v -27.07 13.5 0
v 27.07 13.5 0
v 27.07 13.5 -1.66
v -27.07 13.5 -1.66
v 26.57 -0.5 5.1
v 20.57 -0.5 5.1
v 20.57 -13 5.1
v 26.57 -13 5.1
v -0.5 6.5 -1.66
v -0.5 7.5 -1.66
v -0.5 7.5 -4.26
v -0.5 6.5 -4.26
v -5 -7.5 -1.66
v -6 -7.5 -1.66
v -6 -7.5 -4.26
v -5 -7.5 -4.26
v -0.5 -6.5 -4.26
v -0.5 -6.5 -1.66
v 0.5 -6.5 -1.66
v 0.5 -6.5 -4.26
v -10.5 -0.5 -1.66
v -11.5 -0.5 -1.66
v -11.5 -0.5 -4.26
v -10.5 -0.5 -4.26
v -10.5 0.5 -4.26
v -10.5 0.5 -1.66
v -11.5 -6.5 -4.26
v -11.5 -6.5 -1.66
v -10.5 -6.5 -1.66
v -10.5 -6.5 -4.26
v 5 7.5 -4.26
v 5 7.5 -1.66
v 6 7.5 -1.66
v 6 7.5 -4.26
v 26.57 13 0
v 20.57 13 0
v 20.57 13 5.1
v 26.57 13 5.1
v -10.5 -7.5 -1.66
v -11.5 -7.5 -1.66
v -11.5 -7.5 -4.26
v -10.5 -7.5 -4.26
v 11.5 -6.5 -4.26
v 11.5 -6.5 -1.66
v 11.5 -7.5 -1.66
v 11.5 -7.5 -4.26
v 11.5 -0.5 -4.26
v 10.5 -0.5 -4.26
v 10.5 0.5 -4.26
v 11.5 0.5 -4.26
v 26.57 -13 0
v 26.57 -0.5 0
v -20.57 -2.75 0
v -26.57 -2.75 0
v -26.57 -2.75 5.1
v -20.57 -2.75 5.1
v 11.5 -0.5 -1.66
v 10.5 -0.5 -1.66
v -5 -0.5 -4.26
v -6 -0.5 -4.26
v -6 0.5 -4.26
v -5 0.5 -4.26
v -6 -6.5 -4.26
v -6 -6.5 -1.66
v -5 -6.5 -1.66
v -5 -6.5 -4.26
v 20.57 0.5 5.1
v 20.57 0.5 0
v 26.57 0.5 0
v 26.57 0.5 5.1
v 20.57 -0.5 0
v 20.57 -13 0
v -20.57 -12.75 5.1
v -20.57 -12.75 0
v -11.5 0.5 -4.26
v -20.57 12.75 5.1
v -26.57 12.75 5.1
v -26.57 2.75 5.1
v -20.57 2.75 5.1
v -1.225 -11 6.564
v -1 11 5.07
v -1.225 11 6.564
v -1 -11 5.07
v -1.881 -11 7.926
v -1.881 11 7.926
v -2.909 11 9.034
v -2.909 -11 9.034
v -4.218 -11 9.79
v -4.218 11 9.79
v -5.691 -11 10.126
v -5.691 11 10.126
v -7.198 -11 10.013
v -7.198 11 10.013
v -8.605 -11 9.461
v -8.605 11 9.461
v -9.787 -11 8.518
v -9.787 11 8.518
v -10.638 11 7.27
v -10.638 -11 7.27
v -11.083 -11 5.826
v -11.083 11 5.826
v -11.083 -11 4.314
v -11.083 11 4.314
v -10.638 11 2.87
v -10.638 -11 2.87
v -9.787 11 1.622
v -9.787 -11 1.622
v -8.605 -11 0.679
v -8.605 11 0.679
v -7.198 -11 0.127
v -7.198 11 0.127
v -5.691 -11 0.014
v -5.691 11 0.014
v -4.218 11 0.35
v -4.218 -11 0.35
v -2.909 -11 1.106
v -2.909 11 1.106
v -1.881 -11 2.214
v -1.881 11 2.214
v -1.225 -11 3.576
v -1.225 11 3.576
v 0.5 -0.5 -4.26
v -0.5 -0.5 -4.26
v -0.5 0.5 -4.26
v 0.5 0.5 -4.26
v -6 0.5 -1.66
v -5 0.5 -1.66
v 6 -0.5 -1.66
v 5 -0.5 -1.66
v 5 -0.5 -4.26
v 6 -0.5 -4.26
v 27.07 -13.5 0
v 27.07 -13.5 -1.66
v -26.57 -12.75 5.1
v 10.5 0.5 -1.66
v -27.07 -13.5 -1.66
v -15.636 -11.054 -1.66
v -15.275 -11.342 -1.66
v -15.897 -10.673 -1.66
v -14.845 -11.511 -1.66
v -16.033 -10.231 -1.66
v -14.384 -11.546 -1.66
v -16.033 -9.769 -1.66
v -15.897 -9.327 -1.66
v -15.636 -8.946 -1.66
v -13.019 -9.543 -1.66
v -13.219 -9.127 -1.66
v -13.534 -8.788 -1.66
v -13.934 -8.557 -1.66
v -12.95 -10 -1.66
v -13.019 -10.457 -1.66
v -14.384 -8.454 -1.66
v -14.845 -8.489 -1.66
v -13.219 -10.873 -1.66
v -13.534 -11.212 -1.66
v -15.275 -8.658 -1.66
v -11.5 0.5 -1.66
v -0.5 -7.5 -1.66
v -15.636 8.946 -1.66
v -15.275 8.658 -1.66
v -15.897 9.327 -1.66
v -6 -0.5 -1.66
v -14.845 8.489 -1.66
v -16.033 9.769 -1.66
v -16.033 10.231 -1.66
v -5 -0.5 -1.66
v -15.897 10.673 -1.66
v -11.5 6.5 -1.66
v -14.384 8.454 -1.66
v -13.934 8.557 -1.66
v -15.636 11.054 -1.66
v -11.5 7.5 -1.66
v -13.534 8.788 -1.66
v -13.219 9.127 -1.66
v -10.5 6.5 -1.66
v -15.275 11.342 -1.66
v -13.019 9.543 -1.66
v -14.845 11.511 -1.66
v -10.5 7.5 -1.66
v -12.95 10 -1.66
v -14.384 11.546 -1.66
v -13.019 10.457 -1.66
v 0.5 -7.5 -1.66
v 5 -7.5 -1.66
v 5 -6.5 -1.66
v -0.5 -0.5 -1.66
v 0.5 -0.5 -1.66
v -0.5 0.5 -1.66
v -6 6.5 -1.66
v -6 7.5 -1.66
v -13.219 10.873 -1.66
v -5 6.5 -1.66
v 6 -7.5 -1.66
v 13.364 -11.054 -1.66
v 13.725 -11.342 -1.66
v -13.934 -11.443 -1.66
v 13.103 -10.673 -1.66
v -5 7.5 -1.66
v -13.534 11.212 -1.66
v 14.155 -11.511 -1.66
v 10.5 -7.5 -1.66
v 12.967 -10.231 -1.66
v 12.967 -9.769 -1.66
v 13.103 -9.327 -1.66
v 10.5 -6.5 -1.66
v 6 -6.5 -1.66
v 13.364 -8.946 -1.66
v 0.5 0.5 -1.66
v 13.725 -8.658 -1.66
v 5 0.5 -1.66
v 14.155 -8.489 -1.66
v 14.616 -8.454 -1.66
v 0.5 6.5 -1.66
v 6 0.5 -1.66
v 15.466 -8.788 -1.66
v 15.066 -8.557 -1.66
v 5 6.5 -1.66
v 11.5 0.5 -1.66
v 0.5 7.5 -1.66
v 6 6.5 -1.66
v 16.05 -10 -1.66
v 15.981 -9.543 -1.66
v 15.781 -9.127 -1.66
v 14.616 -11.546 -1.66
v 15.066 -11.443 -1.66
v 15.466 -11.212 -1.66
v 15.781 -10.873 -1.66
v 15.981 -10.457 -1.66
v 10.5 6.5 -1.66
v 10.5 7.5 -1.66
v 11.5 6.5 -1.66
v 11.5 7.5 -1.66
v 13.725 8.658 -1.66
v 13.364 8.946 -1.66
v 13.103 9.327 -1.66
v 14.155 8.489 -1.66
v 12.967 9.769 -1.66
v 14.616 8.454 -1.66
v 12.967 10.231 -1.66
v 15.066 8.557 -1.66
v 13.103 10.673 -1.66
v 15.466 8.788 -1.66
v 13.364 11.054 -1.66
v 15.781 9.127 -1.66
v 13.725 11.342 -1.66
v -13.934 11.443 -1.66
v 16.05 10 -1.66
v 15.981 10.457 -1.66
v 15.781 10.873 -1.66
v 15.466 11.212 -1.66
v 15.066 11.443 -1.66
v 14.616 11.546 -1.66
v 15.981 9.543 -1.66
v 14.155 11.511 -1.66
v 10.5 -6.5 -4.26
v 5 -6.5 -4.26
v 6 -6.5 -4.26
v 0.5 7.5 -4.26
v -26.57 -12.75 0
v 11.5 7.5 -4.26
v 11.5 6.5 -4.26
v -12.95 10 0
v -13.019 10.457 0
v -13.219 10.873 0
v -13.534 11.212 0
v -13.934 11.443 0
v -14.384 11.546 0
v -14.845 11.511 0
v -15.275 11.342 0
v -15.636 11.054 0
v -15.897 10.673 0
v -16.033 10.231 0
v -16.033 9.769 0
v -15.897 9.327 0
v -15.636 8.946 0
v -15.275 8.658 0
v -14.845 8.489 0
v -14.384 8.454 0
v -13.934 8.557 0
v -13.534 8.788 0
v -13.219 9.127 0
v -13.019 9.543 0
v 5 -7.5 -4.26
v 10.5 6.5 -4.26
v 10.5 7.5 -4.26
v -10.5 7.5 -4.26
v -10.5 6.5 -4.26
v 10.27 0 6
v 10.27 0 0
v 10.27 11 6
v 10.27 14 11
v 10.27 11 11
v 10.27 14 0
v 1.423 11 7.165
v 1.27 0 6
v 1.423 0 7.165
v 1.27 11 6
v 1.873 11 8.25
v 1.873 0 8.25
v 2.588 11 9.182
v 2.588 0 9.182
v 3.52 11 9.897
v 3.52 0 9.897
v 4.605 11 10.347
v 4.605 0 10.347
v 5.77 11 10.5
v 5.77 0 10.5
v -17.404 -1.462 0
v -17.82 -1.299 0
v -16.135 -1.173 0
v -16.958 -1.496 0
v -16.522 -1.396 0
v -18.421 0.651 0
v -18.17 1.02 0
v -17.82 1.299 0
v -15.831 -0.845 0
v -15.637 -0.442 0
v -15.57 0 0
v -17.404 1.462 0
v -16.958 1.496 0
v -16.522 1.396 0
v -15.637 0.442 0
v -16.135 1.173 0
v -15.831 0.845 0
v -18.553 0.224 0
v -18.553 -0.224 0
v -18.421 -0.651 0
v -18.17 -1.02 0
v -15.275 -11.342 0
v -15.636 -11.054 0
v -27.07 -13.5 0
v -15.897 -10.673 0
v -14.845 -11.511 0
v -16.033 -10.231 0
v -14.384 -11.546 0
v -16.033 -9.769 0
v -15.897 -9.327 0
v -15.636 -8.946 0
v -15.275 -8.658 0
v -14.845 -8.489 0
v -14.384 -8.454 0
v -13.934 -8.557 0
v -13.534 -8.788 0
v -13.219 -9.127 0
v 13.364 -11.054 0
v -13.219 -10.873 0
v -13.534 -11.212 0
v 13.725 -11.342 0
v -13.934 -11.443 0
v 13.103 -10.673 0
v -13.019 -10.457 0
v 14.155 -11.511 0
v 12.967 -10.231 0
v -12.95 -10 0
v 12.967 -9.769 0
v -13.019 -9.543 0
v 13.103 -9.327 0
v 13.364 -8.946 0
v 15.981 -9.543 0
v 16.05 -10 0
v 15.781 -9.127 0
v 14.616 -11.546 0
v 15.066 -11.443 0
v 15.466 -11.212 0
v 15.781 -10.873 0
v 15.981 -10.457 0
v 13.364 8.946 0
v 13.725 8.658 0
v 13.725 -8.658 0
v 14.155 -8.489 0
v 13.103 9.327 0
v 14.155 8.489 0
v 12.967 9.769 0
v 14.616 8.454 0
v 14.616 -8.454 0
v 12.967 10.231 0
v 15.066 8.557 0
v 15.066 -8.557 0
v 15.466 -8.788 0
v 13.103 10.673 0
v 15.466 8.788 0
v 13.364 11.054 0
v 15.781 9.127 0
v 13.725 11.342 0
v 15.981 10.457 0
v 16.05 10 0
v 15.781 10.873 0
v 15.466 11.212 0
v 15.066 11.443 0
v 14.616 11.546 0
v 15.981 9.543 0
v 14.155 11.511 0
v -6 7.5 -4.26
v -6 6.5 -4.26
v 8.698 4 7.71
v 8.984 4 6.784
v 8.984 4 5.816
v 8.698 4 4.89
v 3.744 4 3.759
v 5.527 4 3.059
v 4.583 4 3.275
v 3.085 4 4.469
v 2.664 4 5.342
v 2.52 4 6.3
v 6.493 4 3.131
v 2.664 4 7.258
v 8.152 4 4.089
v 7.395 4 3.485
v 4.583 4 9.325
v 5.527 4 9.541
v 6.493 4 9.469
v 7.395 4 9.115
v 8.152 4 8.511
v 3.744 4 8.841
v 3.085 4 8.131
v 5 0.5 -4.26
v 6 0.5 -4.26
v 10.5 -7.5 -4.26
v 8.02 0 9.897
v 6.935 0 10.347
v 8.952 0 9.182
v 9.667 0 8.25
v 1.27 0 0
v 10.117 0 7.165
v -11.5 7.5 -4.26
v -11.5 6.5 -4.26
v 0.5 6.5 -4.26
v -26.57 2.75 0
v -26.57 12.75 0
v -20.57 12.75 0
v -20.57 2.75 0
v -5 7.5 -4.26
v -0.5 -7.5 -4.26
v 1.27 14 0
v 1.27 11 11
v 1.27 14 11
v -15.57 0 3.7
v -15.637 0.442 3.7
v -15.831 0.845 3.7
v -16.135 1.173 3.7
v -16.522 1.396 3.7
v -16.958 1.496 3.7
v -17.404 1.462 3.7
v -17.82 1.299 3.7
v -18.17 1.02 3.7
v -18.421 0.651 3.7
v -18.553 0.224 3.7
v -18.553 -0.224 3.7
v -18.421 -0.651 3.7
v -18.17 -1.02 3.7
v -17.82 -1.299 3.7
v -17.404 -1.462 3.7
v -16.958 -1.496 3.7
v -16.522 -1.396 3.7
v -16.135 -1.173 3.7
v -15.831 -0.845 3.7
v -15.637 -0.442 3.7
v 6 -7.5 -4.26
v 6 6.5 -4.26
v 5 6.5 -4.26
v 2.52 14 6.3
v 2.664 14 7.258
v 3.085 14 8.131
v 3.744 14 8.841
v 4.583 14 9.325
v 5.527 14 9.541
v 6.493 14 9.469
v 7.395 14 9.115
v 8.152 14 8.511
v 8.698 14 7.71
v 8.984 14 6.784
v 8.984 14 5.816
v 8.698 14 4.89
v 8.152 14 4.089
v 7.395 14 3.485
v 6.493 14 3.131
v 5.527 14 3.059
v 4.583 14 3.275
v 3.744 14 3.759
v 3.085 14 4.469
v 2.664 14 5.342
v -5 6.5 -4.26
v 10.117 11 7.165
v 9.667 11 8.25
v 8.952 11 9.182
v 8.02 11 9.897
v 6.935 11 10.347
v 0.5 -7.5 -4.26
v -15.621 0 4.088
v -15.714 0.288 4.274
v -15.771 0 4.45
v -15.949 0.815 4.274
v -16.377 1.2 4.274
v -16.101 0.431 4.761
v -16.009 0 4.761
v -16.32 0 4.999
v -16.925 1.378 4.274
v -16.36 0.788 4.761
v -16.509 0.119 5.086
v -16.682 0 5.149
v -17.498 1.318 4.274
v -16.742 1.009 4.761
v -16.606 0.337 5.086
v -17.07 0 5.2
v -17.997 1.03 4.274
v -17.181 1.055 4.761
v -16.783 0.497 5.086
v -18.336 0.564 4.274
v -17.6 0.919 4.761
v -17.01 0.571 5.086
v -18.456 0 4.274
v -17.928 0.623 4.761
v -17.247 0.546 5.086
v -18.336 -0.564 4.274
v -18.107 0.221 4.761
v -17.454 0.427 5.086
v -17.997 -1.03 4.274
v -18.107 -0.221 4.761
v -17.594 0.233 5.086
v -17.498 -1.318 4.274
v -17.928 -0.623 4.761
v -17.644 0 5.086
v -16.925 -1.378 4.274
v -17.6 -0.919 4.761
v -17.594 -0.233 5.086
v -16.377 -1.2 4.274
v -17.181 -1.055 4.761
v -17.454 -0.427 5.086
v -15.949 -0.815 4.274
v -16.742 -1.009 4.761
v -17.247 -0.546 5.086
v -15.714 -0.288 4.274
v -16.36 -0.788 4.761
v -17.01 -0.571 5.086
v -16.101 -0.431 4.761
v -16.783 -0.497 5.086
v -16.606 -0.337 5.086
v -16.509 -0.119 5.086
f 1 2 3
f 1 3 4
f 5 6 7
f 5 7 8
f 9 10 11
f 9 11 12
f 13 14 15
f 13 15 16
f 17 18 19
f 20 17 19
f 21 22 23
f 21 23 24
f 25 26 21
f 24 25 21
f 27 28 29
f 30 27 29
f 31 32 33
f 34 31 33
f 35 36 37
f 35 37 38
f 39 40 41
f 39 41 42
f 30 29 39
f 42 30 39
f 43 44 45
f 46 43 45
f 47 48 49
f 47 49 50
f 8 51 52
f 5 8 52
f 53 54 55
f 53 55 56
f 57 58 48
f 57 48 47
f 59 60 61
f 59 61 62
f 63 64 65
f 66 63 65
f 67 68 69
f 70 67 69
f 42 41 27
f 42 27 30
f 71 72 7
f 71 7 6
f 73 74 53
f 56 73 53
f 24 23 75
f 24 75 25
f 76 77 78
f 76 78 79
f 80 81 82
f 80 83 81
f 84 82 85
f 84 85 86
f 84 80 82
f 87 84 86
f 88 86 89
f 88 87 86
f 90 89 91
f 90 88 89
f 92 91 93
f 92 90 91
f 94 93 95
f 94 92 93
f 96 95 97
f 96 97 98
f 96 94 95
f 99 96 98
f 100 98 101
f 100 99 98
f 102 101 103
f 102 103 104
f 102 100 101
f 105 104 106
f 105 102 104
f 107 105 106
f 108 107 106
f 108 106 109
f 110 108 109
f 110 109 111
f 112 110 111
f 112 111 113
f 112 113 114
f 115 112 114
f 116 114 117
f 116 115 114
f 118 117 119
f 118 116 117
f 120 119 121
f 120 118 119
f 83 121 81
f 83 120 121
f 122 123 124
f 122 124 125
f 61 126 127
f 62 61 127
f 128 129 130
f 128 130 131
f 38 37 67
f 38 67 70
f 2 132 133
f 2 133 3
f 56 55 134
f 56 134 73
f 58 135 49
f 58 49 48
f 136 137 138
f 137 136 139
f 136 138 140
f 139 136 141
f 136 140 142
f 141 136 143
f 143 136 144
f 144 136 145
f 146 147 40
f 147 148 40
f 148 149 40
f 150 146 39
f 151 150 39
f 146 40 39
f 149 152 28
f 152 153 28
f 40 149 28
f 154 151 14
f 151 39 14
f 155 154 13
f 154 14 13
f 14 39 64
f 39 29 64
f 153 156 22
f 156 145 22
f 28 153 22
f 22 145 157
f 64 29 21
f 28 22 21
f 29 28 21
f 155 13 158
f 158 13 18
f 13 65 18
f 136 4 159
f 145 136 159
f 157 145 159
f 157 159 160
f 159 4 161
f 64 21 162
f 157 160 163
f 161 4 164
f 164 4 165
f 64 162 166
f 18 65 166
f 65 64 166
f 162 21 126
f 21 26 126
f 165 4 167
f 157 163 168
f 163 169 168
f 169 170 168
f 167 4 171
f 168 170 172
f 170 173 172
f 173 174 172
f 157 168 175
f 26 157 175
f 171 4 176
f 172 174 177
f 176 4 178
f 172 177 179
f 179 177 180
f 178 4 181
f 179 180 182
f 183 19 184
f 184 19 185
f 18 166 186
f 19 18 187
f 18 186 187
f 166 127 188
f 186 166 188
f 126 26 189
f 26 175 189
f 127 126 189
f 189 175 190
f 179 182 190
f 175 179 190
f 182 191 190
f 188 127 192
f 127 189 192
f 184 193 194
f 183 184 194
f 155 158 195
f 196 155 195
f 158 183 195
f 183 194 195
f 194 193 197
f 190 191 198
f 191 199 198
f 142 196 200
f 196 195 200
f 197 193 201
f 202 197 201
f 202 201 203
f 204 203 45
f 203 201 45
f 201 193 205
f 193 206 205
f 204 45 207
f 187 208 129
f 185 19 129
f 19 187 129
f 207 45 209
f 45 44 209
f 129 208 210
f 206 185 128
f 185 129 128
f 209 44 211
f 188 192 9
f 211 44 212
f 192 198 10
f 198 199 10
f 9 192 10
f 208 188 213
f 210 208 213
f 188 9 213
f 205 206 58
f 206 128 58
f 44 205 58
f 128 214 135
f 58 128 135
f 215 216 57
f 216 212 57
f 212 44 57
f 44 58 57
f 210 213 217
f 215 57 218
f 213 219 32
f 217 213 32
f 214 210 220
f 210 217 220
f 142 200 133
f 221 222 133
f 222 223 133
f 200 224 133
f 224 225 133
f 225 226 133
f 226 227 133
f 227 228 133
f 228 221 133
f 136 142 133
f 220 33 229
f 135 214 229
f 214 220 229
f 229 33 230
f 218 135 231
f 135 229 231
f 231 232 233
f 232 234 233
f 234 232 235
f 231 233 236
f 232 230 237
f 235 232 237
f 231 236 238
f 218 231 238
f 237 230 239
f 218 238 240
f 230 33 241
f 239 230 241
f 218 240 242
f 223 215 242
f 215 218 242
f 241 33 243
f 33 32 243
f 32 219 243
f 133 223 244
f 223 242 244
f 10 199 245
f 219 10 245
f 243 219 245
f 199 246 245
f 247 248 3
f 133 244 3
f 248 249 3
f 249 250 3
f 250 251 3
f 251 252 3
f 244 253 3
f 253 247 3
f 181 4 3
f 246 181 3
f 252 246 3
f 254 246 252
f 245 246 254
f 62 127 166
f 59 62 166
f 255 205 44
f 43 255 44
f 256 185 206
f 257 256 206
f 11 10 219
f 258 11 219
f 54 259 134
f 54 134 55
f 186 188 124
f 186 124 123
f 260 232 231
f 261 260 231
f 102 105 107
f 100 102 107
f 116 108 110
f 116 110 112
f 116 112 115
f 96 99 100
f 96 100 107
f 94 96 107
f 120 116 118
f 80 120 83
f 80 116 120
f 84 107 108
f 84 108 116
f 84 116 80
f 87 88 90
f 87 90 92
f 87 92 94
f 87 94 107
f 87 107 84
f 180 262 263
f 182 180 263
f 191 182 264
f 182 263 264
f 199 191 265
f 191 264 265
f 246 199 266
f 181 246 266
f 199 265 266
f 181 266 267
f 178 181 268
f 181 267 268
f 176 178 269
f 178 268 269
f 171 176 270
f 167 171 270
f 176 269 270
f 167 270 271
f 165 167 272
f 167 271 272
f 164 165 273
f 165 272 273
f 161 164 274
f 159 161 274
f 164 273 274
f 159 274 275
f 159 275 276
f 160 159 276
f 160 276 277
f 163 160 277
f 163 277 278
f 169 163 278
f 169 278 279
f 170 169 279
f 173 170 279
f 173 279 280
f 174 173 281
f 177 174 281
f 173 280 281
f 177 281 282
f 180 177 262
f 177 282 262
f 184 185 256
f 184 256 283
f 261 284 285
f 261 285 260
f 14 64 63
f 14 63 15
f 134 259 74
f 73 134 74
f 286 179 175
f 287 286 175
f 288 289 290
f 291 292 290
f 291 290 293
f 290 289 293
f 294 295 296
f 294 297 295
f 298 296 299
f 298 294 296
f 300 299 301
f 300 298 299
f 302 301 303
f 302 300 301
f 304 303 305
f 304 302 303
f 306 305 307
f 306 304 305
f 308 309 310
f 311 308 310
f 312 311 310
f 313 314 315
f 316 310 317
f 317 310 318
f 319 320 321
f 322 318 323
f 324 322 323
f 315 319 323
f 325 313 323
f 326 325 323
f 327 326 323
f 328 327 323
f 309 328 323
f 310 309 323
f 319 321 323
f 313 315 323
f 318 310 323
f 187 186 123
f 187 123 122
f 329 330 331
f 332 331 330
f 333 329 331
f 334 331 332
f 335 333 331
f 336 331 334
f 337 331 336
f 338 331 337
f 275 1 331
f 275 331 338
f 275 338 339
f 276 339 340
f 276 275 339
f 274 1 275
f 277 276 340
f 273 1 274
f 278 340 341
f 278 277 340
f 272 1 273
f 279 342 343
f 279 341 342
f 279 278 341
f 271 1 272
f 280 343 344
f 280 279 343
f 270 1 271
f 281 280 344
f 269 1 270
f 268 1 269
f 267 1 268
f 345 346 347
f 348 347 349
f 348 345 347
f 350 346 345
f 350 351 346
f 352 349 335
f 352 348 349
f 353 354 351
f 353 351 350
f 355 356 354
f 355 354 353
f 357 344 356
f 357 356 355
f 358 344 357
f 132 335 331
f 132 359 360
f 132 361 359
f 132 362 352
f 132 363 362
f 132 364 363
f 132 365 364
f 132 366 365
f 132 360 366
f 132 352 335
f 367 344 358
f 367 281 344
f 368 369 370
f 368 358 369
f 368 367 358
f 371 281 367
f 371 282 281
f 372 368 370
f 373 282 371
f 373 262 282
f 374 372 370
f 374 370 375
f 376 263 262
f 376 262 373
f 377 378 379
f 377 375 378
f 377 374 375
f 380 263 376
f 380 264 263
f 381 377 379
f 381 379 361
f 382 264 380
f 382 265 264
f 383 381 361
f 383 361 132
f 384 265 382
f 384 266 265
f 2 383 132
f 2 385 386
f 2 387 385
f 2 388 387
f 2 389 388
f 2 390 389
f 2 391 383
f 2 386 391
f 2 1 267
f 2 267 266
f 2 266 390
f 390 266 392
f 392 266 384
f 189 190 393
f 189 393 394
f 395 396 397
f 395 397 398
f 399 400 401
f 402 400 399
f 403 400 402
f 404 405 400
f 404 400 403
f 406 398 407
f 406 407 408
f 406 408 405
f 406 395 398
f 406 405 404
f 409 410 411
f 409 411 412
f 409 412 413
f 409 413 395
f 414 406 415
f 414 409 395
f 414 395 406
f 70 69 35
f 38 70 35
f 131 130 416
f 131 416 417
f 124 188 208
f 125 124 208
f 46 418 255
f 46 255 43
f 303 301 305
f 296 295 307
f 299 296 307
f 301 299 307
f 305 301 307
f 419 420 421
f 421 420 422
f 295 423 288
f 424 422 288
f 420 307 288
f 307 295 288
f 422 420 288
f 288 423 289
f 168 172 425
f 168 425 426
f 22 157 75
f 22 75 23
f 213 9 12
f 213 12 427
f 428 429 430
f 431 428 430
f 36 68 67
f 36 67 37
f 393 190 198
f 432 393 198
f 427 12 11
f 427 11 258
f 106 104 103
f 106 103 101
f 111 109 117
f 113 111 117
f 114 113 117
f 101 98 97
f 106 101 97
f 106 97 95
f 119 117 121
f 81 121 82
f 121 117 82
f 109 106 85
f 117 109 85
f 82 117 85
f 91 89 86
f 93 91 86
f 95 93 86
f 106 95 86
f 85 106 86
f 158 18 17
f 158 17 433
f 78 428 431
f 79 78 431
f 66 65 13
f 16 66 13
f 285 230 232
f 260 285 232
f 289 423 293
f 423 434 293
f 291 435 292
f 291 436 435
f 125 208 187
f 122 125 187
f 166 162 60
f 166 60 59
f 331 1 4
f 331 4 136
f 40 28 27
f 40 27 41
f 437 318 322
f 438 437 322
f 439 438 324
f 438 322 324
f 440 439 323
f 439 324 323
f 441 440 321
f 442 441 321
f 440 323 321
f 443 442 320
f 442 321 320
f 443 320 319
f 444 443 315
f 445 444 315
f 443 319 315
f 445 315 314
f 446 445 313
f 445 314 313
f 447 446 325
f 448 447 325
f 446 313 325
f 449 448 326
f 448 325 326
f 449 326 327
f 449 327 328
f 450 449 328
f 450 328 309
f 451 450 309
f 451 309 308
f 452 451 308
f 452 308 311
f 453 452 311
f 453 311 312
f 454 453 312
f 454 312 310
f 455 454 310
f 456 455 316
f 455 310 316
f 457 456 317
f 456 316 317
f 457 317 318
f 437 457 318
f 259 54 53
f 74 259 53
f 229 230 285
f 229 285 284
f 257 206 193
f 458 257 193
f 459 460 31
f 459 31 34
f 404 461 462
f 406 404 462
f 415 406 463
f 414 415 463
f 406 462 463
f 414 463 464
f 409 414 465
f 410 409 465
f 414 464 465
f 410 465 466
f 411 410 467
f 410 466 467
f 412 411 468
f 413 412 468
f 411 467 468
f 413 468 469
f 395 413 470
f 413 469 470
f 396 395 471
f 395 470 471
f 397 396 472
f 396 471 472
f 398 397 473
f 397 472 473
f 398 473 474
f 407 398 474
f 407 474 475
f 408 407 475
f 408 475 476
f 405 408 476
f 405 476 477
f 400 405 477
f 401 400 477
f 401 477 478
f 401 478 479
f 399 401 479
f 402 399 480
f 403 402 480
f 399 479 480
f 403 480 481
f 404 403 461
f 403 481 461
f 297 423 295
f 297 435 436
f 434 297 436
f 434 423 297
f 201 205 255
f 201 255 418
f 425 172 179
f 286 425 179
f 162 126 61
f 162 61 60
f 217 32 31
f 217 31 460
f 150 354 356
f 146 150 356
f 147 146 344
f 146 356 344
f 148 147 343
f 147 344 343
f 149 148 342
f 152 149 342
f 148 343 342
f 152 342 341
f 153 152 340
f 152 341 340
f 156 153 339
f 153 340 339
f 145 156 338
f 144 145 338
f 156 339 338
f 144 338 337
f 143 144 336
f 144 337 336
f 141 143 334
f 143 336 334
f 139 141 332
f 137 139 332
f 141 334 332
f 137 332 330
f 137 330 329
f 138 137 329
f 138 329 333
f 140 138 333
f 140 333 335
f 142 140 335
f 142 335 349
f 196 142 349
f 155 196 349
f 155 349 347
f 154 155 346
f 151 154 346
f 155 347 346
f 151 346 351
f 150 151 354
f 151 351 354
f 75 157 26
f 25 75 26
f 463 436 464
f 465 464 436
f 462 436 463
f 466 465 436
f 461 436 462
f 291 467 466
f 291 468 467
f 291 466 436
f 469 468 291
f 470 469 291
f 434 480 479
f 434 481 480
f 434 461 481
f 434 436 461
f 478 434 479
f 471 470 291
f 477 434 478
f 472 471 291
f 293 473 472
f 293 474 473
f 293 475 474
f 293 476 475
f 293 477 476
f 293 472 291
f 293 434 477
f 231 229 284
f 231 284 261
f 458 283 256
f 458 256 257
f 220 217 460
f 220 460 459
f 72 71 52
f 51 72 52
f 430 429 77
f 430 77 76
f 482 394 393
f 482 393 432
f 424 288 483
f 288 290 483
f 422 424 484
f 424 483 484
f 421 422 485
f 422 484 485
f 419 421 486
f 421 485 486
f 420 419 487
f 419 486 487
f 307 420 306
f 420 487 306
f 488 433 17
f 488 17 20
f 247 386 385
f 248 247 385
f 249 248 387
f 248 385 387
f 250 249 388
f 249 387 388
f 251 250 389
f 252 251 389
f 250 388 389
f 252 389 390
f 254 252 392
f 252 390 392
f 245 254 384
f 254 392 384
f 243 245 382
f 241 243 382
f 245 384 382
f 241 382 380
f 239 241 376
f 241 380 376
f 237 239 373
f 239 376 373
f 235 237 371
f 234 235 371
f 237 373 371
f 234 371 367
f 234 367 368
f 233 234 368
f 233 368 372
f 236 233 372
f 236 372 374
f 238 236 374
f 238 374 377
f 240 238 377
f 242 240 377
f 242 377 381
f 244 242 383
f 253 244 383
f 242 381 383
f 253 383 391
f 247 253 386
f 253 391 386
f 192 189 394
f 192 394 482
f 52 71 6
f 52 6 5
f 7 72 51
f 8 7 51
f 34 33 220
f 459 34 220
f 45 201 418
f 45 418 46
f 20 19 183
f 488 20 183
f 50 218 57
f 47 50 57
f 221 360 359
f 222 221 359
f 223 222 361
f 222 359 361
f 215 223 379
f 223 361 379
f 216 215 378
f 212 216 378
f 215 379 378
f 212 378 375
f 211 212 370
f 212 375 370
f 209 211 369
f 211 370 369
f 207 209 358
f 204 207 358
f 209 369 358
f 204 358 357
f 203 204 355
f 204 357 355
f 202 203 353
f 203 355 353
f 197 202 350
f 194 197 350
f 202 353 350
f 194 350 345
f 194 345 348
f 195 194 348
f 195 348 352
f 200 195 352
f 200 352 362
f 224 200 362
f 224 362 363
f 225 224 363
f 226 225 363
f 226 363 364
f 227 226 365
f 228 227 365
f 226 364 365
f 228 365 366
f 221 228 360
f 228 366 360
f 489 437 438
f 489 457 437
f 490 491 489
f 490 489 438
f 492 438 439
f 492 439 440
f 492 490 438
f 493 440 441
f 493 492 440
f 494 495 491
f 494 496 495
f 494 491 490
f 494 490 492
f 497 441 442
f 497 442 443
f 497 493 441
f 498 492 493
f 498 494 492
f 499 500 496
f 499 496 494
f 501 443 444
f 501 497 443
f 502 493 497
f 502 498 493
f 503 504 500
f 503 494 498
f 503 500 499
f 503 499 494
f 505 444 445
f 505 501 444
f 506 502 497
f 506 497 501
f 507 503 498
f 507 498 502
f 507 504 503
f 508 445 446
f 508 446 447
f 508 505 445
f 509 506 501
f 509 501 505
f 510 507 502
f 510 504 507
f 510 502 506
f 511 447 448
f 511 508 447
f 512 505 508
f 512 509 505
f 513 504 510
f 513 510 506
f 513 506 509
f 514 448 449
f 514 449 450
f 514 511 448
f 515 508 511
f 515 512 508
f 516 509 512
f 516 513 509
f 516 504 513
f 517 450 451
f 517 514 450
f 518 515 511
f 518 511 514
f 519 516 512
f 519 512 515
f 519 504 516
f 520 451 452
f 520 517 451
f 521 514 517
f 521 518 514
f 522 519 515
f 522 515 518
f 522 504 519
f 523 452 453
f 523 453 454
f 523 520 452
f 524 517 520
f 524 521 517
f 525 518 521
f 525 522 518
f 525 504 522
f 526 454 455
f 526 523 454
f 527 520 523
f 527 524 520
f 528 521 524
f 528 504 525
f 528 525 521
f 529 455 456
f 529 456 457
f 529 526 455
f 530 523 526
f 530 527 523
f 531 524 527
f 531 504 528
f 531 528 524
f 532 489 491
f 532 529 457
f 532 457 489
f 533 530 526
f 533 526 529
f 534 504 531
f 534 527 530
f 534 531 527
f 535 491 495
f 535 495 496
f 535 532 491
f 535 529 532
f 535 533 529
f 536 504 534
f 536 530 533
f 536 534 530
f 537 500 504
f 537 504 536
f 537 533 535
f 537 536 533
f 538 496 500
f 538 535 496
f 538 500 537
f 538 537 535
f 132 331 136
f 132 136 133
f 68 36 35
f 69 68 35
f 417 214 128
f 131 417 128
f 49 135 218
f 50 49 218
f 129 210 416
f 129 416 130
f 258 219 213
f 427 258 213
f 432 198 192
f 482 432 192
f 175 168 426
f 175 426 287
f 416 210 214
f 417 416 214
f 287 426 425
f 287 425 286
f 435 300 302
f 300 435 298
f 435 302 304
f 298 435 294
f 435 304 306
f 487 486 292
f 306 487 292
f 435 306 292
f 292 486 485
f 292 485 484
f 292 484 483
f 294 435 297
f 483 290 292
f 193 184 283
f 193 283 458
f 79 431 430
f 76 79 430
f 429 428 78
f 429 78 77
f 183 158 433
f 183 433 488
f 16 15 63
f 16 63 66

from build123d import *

# Parameters (mm, degrees)
F0_W           = 6
F0_H           = 10
F0_R           = 1.55
F0_R_2         = 1.5
F0_W_2         = 10
F0_H_2         = 22
F0_H_3         = 12.5
F0_W_3         = 9
F0_H_4         = 11
F0_H_5         = 2.5
F1_DEPTH       = 1.66
F0_H_6         = 0.5
F2_DEPTH       = 11
F3_DEPTH       = 10.5
F4_R           = 4.49999
F5_R           = 3.25
F6_DEPTH       = 10
F7_DEPTH       = 5.2
F8_R           = 1.5
F9_R           = 5.07
F10_DEPTH      = 11
F10_DEPTH_BACK = 11
F11_DEPTH      = 5.1
F12_W          = 1
F12_H          = 1
F13_DEPTH      = 2.6


# Not quite as in the source:
# - a fillet or chamfer is up to 0.001 mm smaller than in the source, because OpenCascade refuses the exact size


with BuildPart() as f1:
    # F0 (on Top) → F1 (new body)
    with BuildSketch(Plane.XY):
        Polygon((-27.07, -13.5), (27.07, -13.5), (27.07, 13.5), (10.27, 13.5), (10.27, 11), (10.27, 0), (1.27, 0), (1.27, 11), (1.27, 13.5), (-27.07, 13.5), align=None)
        with Locations((-23.57, -7.75)):
            Rectangle(F0_W, F0_H, mode=Mode.SUBTRACT)
        with Locations((-14.5, -10)):
            Circle(F0_R, mode=Mode.SUBTRACT)
        with Locations((-17.07, 0)):
            Circle(F0_R_2, mode=Mode.SUBTRACT)
        with Locations((-6.07, 0)):
            Rectangle(F0_W_2, F0_H_2, mode=Mode.SUBTRACT)
        with Locations((14.5, -10)):
            Circle(F0_R, mode=Mode.SUBTRACT)
        with Locations((23.57, -6.75)):
            Rectangle(F0_W, F0_H_3, mode=Mode.SUBTRACT)
        with Locations((-23.57, 7.75)):
            Rectangle(F0_W, F0_H, mode=Mode.SUBTRACT)
        with Locations((-14.5, 10)):
            Circle(F0_R, mode=Mode.SUBTRACT)
        with Locations((23.57, 6.75)):
            Rectangle(F0_W, F0_H_3, mode=Mode.SUBTRACT)
        with Locations((14.5, 10)):
            Circle(F0_R, mode=Mode.SUBTRACT)
        with Locations((-6.07, 0)):
            Rectangle(F0_W_2, F0_H_2)
        with Locations((5.77, 5.5)):
            Rectangle(F0_W_3, F0_H_4)
        with Locations((23.57, 6.75)):
            Rectangle(F0_W, F0_H_3)
        with Locations((23.57, -6.75)):
            Rectangle(F0_W, F0_H_3)
        with Locations((-23.57, 7.75)):
            Rectangle(F0_W, F0_H)
        with Locations((-23.57, -7.75)):
            Rectangle(F0_W, F0_H)
        with Locations((5.77, 12.25)):
            Rectangle(F0_W_3, F0_H_5)
        with Locations((-17.07, 0)):
            Circle(F0_R_2)
    extrude(amount=-F1_DEPTH)

    # F12 (on face) → F13 (join)
    with BuildSketch(Plane(origin=(0, 0, -1.66), x_dir=(1, 0, 0), z_dir=(0, 0, -1))):
        Rectangle(F12_W, F12_H)
        with Locations((0, 7)):
            Rectangle(F12_W, F12_H)
        with Locations((5.5, 7)):
            Rectangle(F12_W, F12_H)
        with Locations((11, 7)):
            Rectangle(F12_W, F12_H)
        with Locations((11, 0)):
            Rectangle(F12_W, F12_H)
        with Locations((5.5, 0)):
            Rectangle(F12_W, F12_H)
        with Locations((11, -7)):
            Rectangle(F12_W, F12_H)
        with Locations((5.5, -7)):
            Rectangle(F12_W, F12_H)
        with Locations((0, -7)):
            Rectangle(F12_W, F12_H)
        with Locations((-5.5, -7)):
            Rectangle(F12_W, F12_H)
        with Locations((-5.5, 0)):
            Rectangle(F12_W, F12_H)
        with Locations((-5.5, 7)):
            Rectangle(F12_W, F12_H)
        with Locations((-11, 7)):
            Rectangle(F12_W, F12_H)
        with Locations((-11, 0)):
            Rectangle(F12_W, F12_H)
        with Locations((-11, -7)):
            Rectangle(F12_W, F12_H)
    extrude(amount=F13_DEPTH)


with BuildPart() as f2:
    # F0 (on Top) → F2 (new body)
    with BuildSketch(Plane.XY):
        with Locations((5.77, 12.25)):
            Rectangle(F0_W_3, F0_H_5)
        with Locations((5.77, 13.75)):
            Rectangle(F0_W_3, F0_H_6)
    extrude(amount=F2_DEPTH)

    # F0 (on Top) → F3 (join)
    with BuildSketch(Plane.XY):
        with Locations((5.77, 5.5)):
            Rectangle(F0_W_3, F0_H_4)
    extrude(amount=F3_DEPTH)

    # F4 (radius 4.5 in the source; OpenCascade refuses exactly that, so slightly less here)
    f4_edges = [f2.edges().sort_by_distance(p)[0] for p in [
        (1.27, 5.5, 10.5),
        (10.27, 5.5, 10.5),
    ]]
    fillet(f4_edges, radius=F4_R)

    # F5 (on face) → F6 (cut)
    with BuildSketch(Plane(origin=(0, 14, 0), x_dir=(-1, 0, 0), z_dir=(0, 1, 0))):
        with Locations((-5.77, 6.3)):
            Circle(F5_R)
    extrude(amount=-F6_DEPTH, mode=Mode.SUBTRACT)


with BuildPart() as f7:
    # F0 (on Top) → F7 (new body)
    with BuildSketch(Plane.XY):
        with Locations((-17.07, 0)):
            Circle(F0_R_2)
    extrude(amount=F7_DEPTH)

    # F8
    f8_edges = [f7.edges().sort_by_distance(p)[0] for p in [
        (-18.57, 0, 5.2),
    ]]
    fillet(f8_edges, radius=F8_R)


with BuildPart() as f10:
    # F9 (on Front) → F10 (new body, two sides)
    with BuildSketch(Plane.XZ) as f10_sk:
        with Locations((-6.07, 5.07)):
            Circle(F9_R)
    extrude(amount=F10_DEPTH)
    extrude(f10_sk.sketch, amount=-F10_DEPTH_BACK)


with BuildPart() as f11:
    # F0 (on Top) → F11 (new body)
    with BuildSketch(Plane.XY):
        with Locations((23.57, 6.75)):
            Rectangle(F0_W, F0_H_3)
    extrude(amount=F11_DEPTH)


with BuildPart() as f11b:
    # F0 (on Top) → F11, piece 2 (new body)
    with BuildSketch(Plane.XY):
        with Locations((23.57, -6.75)):
            Rectangle(F0_W, F0_H_3)
    extrude(amount=F11_DEPTH)


with BuildPart() as f11c:
    # F0 (on Top) → F11, piece 3 (new body)
    with BuildSketch(Plane.XY):
        with Locations((-23.57, -7.75)):
            Rectangle(F0_W, F0_H)
    extrude(amount=F11_DEPTH)


with BuildPart() as f11d:
    # F0 (on Top) → F11, piece 4 (new body)
    with BuildSketch(Plane.XY):
        with Locations((-23.57, 7.75)):
            Rectangle(F0_W, F0_H)
    extrude(amount=F11_DEPTH)


solid = Compound([f1.part, f2.part, f7.part, f10.part, f11.part, f11b.part, f11c.part, f11d.part])
